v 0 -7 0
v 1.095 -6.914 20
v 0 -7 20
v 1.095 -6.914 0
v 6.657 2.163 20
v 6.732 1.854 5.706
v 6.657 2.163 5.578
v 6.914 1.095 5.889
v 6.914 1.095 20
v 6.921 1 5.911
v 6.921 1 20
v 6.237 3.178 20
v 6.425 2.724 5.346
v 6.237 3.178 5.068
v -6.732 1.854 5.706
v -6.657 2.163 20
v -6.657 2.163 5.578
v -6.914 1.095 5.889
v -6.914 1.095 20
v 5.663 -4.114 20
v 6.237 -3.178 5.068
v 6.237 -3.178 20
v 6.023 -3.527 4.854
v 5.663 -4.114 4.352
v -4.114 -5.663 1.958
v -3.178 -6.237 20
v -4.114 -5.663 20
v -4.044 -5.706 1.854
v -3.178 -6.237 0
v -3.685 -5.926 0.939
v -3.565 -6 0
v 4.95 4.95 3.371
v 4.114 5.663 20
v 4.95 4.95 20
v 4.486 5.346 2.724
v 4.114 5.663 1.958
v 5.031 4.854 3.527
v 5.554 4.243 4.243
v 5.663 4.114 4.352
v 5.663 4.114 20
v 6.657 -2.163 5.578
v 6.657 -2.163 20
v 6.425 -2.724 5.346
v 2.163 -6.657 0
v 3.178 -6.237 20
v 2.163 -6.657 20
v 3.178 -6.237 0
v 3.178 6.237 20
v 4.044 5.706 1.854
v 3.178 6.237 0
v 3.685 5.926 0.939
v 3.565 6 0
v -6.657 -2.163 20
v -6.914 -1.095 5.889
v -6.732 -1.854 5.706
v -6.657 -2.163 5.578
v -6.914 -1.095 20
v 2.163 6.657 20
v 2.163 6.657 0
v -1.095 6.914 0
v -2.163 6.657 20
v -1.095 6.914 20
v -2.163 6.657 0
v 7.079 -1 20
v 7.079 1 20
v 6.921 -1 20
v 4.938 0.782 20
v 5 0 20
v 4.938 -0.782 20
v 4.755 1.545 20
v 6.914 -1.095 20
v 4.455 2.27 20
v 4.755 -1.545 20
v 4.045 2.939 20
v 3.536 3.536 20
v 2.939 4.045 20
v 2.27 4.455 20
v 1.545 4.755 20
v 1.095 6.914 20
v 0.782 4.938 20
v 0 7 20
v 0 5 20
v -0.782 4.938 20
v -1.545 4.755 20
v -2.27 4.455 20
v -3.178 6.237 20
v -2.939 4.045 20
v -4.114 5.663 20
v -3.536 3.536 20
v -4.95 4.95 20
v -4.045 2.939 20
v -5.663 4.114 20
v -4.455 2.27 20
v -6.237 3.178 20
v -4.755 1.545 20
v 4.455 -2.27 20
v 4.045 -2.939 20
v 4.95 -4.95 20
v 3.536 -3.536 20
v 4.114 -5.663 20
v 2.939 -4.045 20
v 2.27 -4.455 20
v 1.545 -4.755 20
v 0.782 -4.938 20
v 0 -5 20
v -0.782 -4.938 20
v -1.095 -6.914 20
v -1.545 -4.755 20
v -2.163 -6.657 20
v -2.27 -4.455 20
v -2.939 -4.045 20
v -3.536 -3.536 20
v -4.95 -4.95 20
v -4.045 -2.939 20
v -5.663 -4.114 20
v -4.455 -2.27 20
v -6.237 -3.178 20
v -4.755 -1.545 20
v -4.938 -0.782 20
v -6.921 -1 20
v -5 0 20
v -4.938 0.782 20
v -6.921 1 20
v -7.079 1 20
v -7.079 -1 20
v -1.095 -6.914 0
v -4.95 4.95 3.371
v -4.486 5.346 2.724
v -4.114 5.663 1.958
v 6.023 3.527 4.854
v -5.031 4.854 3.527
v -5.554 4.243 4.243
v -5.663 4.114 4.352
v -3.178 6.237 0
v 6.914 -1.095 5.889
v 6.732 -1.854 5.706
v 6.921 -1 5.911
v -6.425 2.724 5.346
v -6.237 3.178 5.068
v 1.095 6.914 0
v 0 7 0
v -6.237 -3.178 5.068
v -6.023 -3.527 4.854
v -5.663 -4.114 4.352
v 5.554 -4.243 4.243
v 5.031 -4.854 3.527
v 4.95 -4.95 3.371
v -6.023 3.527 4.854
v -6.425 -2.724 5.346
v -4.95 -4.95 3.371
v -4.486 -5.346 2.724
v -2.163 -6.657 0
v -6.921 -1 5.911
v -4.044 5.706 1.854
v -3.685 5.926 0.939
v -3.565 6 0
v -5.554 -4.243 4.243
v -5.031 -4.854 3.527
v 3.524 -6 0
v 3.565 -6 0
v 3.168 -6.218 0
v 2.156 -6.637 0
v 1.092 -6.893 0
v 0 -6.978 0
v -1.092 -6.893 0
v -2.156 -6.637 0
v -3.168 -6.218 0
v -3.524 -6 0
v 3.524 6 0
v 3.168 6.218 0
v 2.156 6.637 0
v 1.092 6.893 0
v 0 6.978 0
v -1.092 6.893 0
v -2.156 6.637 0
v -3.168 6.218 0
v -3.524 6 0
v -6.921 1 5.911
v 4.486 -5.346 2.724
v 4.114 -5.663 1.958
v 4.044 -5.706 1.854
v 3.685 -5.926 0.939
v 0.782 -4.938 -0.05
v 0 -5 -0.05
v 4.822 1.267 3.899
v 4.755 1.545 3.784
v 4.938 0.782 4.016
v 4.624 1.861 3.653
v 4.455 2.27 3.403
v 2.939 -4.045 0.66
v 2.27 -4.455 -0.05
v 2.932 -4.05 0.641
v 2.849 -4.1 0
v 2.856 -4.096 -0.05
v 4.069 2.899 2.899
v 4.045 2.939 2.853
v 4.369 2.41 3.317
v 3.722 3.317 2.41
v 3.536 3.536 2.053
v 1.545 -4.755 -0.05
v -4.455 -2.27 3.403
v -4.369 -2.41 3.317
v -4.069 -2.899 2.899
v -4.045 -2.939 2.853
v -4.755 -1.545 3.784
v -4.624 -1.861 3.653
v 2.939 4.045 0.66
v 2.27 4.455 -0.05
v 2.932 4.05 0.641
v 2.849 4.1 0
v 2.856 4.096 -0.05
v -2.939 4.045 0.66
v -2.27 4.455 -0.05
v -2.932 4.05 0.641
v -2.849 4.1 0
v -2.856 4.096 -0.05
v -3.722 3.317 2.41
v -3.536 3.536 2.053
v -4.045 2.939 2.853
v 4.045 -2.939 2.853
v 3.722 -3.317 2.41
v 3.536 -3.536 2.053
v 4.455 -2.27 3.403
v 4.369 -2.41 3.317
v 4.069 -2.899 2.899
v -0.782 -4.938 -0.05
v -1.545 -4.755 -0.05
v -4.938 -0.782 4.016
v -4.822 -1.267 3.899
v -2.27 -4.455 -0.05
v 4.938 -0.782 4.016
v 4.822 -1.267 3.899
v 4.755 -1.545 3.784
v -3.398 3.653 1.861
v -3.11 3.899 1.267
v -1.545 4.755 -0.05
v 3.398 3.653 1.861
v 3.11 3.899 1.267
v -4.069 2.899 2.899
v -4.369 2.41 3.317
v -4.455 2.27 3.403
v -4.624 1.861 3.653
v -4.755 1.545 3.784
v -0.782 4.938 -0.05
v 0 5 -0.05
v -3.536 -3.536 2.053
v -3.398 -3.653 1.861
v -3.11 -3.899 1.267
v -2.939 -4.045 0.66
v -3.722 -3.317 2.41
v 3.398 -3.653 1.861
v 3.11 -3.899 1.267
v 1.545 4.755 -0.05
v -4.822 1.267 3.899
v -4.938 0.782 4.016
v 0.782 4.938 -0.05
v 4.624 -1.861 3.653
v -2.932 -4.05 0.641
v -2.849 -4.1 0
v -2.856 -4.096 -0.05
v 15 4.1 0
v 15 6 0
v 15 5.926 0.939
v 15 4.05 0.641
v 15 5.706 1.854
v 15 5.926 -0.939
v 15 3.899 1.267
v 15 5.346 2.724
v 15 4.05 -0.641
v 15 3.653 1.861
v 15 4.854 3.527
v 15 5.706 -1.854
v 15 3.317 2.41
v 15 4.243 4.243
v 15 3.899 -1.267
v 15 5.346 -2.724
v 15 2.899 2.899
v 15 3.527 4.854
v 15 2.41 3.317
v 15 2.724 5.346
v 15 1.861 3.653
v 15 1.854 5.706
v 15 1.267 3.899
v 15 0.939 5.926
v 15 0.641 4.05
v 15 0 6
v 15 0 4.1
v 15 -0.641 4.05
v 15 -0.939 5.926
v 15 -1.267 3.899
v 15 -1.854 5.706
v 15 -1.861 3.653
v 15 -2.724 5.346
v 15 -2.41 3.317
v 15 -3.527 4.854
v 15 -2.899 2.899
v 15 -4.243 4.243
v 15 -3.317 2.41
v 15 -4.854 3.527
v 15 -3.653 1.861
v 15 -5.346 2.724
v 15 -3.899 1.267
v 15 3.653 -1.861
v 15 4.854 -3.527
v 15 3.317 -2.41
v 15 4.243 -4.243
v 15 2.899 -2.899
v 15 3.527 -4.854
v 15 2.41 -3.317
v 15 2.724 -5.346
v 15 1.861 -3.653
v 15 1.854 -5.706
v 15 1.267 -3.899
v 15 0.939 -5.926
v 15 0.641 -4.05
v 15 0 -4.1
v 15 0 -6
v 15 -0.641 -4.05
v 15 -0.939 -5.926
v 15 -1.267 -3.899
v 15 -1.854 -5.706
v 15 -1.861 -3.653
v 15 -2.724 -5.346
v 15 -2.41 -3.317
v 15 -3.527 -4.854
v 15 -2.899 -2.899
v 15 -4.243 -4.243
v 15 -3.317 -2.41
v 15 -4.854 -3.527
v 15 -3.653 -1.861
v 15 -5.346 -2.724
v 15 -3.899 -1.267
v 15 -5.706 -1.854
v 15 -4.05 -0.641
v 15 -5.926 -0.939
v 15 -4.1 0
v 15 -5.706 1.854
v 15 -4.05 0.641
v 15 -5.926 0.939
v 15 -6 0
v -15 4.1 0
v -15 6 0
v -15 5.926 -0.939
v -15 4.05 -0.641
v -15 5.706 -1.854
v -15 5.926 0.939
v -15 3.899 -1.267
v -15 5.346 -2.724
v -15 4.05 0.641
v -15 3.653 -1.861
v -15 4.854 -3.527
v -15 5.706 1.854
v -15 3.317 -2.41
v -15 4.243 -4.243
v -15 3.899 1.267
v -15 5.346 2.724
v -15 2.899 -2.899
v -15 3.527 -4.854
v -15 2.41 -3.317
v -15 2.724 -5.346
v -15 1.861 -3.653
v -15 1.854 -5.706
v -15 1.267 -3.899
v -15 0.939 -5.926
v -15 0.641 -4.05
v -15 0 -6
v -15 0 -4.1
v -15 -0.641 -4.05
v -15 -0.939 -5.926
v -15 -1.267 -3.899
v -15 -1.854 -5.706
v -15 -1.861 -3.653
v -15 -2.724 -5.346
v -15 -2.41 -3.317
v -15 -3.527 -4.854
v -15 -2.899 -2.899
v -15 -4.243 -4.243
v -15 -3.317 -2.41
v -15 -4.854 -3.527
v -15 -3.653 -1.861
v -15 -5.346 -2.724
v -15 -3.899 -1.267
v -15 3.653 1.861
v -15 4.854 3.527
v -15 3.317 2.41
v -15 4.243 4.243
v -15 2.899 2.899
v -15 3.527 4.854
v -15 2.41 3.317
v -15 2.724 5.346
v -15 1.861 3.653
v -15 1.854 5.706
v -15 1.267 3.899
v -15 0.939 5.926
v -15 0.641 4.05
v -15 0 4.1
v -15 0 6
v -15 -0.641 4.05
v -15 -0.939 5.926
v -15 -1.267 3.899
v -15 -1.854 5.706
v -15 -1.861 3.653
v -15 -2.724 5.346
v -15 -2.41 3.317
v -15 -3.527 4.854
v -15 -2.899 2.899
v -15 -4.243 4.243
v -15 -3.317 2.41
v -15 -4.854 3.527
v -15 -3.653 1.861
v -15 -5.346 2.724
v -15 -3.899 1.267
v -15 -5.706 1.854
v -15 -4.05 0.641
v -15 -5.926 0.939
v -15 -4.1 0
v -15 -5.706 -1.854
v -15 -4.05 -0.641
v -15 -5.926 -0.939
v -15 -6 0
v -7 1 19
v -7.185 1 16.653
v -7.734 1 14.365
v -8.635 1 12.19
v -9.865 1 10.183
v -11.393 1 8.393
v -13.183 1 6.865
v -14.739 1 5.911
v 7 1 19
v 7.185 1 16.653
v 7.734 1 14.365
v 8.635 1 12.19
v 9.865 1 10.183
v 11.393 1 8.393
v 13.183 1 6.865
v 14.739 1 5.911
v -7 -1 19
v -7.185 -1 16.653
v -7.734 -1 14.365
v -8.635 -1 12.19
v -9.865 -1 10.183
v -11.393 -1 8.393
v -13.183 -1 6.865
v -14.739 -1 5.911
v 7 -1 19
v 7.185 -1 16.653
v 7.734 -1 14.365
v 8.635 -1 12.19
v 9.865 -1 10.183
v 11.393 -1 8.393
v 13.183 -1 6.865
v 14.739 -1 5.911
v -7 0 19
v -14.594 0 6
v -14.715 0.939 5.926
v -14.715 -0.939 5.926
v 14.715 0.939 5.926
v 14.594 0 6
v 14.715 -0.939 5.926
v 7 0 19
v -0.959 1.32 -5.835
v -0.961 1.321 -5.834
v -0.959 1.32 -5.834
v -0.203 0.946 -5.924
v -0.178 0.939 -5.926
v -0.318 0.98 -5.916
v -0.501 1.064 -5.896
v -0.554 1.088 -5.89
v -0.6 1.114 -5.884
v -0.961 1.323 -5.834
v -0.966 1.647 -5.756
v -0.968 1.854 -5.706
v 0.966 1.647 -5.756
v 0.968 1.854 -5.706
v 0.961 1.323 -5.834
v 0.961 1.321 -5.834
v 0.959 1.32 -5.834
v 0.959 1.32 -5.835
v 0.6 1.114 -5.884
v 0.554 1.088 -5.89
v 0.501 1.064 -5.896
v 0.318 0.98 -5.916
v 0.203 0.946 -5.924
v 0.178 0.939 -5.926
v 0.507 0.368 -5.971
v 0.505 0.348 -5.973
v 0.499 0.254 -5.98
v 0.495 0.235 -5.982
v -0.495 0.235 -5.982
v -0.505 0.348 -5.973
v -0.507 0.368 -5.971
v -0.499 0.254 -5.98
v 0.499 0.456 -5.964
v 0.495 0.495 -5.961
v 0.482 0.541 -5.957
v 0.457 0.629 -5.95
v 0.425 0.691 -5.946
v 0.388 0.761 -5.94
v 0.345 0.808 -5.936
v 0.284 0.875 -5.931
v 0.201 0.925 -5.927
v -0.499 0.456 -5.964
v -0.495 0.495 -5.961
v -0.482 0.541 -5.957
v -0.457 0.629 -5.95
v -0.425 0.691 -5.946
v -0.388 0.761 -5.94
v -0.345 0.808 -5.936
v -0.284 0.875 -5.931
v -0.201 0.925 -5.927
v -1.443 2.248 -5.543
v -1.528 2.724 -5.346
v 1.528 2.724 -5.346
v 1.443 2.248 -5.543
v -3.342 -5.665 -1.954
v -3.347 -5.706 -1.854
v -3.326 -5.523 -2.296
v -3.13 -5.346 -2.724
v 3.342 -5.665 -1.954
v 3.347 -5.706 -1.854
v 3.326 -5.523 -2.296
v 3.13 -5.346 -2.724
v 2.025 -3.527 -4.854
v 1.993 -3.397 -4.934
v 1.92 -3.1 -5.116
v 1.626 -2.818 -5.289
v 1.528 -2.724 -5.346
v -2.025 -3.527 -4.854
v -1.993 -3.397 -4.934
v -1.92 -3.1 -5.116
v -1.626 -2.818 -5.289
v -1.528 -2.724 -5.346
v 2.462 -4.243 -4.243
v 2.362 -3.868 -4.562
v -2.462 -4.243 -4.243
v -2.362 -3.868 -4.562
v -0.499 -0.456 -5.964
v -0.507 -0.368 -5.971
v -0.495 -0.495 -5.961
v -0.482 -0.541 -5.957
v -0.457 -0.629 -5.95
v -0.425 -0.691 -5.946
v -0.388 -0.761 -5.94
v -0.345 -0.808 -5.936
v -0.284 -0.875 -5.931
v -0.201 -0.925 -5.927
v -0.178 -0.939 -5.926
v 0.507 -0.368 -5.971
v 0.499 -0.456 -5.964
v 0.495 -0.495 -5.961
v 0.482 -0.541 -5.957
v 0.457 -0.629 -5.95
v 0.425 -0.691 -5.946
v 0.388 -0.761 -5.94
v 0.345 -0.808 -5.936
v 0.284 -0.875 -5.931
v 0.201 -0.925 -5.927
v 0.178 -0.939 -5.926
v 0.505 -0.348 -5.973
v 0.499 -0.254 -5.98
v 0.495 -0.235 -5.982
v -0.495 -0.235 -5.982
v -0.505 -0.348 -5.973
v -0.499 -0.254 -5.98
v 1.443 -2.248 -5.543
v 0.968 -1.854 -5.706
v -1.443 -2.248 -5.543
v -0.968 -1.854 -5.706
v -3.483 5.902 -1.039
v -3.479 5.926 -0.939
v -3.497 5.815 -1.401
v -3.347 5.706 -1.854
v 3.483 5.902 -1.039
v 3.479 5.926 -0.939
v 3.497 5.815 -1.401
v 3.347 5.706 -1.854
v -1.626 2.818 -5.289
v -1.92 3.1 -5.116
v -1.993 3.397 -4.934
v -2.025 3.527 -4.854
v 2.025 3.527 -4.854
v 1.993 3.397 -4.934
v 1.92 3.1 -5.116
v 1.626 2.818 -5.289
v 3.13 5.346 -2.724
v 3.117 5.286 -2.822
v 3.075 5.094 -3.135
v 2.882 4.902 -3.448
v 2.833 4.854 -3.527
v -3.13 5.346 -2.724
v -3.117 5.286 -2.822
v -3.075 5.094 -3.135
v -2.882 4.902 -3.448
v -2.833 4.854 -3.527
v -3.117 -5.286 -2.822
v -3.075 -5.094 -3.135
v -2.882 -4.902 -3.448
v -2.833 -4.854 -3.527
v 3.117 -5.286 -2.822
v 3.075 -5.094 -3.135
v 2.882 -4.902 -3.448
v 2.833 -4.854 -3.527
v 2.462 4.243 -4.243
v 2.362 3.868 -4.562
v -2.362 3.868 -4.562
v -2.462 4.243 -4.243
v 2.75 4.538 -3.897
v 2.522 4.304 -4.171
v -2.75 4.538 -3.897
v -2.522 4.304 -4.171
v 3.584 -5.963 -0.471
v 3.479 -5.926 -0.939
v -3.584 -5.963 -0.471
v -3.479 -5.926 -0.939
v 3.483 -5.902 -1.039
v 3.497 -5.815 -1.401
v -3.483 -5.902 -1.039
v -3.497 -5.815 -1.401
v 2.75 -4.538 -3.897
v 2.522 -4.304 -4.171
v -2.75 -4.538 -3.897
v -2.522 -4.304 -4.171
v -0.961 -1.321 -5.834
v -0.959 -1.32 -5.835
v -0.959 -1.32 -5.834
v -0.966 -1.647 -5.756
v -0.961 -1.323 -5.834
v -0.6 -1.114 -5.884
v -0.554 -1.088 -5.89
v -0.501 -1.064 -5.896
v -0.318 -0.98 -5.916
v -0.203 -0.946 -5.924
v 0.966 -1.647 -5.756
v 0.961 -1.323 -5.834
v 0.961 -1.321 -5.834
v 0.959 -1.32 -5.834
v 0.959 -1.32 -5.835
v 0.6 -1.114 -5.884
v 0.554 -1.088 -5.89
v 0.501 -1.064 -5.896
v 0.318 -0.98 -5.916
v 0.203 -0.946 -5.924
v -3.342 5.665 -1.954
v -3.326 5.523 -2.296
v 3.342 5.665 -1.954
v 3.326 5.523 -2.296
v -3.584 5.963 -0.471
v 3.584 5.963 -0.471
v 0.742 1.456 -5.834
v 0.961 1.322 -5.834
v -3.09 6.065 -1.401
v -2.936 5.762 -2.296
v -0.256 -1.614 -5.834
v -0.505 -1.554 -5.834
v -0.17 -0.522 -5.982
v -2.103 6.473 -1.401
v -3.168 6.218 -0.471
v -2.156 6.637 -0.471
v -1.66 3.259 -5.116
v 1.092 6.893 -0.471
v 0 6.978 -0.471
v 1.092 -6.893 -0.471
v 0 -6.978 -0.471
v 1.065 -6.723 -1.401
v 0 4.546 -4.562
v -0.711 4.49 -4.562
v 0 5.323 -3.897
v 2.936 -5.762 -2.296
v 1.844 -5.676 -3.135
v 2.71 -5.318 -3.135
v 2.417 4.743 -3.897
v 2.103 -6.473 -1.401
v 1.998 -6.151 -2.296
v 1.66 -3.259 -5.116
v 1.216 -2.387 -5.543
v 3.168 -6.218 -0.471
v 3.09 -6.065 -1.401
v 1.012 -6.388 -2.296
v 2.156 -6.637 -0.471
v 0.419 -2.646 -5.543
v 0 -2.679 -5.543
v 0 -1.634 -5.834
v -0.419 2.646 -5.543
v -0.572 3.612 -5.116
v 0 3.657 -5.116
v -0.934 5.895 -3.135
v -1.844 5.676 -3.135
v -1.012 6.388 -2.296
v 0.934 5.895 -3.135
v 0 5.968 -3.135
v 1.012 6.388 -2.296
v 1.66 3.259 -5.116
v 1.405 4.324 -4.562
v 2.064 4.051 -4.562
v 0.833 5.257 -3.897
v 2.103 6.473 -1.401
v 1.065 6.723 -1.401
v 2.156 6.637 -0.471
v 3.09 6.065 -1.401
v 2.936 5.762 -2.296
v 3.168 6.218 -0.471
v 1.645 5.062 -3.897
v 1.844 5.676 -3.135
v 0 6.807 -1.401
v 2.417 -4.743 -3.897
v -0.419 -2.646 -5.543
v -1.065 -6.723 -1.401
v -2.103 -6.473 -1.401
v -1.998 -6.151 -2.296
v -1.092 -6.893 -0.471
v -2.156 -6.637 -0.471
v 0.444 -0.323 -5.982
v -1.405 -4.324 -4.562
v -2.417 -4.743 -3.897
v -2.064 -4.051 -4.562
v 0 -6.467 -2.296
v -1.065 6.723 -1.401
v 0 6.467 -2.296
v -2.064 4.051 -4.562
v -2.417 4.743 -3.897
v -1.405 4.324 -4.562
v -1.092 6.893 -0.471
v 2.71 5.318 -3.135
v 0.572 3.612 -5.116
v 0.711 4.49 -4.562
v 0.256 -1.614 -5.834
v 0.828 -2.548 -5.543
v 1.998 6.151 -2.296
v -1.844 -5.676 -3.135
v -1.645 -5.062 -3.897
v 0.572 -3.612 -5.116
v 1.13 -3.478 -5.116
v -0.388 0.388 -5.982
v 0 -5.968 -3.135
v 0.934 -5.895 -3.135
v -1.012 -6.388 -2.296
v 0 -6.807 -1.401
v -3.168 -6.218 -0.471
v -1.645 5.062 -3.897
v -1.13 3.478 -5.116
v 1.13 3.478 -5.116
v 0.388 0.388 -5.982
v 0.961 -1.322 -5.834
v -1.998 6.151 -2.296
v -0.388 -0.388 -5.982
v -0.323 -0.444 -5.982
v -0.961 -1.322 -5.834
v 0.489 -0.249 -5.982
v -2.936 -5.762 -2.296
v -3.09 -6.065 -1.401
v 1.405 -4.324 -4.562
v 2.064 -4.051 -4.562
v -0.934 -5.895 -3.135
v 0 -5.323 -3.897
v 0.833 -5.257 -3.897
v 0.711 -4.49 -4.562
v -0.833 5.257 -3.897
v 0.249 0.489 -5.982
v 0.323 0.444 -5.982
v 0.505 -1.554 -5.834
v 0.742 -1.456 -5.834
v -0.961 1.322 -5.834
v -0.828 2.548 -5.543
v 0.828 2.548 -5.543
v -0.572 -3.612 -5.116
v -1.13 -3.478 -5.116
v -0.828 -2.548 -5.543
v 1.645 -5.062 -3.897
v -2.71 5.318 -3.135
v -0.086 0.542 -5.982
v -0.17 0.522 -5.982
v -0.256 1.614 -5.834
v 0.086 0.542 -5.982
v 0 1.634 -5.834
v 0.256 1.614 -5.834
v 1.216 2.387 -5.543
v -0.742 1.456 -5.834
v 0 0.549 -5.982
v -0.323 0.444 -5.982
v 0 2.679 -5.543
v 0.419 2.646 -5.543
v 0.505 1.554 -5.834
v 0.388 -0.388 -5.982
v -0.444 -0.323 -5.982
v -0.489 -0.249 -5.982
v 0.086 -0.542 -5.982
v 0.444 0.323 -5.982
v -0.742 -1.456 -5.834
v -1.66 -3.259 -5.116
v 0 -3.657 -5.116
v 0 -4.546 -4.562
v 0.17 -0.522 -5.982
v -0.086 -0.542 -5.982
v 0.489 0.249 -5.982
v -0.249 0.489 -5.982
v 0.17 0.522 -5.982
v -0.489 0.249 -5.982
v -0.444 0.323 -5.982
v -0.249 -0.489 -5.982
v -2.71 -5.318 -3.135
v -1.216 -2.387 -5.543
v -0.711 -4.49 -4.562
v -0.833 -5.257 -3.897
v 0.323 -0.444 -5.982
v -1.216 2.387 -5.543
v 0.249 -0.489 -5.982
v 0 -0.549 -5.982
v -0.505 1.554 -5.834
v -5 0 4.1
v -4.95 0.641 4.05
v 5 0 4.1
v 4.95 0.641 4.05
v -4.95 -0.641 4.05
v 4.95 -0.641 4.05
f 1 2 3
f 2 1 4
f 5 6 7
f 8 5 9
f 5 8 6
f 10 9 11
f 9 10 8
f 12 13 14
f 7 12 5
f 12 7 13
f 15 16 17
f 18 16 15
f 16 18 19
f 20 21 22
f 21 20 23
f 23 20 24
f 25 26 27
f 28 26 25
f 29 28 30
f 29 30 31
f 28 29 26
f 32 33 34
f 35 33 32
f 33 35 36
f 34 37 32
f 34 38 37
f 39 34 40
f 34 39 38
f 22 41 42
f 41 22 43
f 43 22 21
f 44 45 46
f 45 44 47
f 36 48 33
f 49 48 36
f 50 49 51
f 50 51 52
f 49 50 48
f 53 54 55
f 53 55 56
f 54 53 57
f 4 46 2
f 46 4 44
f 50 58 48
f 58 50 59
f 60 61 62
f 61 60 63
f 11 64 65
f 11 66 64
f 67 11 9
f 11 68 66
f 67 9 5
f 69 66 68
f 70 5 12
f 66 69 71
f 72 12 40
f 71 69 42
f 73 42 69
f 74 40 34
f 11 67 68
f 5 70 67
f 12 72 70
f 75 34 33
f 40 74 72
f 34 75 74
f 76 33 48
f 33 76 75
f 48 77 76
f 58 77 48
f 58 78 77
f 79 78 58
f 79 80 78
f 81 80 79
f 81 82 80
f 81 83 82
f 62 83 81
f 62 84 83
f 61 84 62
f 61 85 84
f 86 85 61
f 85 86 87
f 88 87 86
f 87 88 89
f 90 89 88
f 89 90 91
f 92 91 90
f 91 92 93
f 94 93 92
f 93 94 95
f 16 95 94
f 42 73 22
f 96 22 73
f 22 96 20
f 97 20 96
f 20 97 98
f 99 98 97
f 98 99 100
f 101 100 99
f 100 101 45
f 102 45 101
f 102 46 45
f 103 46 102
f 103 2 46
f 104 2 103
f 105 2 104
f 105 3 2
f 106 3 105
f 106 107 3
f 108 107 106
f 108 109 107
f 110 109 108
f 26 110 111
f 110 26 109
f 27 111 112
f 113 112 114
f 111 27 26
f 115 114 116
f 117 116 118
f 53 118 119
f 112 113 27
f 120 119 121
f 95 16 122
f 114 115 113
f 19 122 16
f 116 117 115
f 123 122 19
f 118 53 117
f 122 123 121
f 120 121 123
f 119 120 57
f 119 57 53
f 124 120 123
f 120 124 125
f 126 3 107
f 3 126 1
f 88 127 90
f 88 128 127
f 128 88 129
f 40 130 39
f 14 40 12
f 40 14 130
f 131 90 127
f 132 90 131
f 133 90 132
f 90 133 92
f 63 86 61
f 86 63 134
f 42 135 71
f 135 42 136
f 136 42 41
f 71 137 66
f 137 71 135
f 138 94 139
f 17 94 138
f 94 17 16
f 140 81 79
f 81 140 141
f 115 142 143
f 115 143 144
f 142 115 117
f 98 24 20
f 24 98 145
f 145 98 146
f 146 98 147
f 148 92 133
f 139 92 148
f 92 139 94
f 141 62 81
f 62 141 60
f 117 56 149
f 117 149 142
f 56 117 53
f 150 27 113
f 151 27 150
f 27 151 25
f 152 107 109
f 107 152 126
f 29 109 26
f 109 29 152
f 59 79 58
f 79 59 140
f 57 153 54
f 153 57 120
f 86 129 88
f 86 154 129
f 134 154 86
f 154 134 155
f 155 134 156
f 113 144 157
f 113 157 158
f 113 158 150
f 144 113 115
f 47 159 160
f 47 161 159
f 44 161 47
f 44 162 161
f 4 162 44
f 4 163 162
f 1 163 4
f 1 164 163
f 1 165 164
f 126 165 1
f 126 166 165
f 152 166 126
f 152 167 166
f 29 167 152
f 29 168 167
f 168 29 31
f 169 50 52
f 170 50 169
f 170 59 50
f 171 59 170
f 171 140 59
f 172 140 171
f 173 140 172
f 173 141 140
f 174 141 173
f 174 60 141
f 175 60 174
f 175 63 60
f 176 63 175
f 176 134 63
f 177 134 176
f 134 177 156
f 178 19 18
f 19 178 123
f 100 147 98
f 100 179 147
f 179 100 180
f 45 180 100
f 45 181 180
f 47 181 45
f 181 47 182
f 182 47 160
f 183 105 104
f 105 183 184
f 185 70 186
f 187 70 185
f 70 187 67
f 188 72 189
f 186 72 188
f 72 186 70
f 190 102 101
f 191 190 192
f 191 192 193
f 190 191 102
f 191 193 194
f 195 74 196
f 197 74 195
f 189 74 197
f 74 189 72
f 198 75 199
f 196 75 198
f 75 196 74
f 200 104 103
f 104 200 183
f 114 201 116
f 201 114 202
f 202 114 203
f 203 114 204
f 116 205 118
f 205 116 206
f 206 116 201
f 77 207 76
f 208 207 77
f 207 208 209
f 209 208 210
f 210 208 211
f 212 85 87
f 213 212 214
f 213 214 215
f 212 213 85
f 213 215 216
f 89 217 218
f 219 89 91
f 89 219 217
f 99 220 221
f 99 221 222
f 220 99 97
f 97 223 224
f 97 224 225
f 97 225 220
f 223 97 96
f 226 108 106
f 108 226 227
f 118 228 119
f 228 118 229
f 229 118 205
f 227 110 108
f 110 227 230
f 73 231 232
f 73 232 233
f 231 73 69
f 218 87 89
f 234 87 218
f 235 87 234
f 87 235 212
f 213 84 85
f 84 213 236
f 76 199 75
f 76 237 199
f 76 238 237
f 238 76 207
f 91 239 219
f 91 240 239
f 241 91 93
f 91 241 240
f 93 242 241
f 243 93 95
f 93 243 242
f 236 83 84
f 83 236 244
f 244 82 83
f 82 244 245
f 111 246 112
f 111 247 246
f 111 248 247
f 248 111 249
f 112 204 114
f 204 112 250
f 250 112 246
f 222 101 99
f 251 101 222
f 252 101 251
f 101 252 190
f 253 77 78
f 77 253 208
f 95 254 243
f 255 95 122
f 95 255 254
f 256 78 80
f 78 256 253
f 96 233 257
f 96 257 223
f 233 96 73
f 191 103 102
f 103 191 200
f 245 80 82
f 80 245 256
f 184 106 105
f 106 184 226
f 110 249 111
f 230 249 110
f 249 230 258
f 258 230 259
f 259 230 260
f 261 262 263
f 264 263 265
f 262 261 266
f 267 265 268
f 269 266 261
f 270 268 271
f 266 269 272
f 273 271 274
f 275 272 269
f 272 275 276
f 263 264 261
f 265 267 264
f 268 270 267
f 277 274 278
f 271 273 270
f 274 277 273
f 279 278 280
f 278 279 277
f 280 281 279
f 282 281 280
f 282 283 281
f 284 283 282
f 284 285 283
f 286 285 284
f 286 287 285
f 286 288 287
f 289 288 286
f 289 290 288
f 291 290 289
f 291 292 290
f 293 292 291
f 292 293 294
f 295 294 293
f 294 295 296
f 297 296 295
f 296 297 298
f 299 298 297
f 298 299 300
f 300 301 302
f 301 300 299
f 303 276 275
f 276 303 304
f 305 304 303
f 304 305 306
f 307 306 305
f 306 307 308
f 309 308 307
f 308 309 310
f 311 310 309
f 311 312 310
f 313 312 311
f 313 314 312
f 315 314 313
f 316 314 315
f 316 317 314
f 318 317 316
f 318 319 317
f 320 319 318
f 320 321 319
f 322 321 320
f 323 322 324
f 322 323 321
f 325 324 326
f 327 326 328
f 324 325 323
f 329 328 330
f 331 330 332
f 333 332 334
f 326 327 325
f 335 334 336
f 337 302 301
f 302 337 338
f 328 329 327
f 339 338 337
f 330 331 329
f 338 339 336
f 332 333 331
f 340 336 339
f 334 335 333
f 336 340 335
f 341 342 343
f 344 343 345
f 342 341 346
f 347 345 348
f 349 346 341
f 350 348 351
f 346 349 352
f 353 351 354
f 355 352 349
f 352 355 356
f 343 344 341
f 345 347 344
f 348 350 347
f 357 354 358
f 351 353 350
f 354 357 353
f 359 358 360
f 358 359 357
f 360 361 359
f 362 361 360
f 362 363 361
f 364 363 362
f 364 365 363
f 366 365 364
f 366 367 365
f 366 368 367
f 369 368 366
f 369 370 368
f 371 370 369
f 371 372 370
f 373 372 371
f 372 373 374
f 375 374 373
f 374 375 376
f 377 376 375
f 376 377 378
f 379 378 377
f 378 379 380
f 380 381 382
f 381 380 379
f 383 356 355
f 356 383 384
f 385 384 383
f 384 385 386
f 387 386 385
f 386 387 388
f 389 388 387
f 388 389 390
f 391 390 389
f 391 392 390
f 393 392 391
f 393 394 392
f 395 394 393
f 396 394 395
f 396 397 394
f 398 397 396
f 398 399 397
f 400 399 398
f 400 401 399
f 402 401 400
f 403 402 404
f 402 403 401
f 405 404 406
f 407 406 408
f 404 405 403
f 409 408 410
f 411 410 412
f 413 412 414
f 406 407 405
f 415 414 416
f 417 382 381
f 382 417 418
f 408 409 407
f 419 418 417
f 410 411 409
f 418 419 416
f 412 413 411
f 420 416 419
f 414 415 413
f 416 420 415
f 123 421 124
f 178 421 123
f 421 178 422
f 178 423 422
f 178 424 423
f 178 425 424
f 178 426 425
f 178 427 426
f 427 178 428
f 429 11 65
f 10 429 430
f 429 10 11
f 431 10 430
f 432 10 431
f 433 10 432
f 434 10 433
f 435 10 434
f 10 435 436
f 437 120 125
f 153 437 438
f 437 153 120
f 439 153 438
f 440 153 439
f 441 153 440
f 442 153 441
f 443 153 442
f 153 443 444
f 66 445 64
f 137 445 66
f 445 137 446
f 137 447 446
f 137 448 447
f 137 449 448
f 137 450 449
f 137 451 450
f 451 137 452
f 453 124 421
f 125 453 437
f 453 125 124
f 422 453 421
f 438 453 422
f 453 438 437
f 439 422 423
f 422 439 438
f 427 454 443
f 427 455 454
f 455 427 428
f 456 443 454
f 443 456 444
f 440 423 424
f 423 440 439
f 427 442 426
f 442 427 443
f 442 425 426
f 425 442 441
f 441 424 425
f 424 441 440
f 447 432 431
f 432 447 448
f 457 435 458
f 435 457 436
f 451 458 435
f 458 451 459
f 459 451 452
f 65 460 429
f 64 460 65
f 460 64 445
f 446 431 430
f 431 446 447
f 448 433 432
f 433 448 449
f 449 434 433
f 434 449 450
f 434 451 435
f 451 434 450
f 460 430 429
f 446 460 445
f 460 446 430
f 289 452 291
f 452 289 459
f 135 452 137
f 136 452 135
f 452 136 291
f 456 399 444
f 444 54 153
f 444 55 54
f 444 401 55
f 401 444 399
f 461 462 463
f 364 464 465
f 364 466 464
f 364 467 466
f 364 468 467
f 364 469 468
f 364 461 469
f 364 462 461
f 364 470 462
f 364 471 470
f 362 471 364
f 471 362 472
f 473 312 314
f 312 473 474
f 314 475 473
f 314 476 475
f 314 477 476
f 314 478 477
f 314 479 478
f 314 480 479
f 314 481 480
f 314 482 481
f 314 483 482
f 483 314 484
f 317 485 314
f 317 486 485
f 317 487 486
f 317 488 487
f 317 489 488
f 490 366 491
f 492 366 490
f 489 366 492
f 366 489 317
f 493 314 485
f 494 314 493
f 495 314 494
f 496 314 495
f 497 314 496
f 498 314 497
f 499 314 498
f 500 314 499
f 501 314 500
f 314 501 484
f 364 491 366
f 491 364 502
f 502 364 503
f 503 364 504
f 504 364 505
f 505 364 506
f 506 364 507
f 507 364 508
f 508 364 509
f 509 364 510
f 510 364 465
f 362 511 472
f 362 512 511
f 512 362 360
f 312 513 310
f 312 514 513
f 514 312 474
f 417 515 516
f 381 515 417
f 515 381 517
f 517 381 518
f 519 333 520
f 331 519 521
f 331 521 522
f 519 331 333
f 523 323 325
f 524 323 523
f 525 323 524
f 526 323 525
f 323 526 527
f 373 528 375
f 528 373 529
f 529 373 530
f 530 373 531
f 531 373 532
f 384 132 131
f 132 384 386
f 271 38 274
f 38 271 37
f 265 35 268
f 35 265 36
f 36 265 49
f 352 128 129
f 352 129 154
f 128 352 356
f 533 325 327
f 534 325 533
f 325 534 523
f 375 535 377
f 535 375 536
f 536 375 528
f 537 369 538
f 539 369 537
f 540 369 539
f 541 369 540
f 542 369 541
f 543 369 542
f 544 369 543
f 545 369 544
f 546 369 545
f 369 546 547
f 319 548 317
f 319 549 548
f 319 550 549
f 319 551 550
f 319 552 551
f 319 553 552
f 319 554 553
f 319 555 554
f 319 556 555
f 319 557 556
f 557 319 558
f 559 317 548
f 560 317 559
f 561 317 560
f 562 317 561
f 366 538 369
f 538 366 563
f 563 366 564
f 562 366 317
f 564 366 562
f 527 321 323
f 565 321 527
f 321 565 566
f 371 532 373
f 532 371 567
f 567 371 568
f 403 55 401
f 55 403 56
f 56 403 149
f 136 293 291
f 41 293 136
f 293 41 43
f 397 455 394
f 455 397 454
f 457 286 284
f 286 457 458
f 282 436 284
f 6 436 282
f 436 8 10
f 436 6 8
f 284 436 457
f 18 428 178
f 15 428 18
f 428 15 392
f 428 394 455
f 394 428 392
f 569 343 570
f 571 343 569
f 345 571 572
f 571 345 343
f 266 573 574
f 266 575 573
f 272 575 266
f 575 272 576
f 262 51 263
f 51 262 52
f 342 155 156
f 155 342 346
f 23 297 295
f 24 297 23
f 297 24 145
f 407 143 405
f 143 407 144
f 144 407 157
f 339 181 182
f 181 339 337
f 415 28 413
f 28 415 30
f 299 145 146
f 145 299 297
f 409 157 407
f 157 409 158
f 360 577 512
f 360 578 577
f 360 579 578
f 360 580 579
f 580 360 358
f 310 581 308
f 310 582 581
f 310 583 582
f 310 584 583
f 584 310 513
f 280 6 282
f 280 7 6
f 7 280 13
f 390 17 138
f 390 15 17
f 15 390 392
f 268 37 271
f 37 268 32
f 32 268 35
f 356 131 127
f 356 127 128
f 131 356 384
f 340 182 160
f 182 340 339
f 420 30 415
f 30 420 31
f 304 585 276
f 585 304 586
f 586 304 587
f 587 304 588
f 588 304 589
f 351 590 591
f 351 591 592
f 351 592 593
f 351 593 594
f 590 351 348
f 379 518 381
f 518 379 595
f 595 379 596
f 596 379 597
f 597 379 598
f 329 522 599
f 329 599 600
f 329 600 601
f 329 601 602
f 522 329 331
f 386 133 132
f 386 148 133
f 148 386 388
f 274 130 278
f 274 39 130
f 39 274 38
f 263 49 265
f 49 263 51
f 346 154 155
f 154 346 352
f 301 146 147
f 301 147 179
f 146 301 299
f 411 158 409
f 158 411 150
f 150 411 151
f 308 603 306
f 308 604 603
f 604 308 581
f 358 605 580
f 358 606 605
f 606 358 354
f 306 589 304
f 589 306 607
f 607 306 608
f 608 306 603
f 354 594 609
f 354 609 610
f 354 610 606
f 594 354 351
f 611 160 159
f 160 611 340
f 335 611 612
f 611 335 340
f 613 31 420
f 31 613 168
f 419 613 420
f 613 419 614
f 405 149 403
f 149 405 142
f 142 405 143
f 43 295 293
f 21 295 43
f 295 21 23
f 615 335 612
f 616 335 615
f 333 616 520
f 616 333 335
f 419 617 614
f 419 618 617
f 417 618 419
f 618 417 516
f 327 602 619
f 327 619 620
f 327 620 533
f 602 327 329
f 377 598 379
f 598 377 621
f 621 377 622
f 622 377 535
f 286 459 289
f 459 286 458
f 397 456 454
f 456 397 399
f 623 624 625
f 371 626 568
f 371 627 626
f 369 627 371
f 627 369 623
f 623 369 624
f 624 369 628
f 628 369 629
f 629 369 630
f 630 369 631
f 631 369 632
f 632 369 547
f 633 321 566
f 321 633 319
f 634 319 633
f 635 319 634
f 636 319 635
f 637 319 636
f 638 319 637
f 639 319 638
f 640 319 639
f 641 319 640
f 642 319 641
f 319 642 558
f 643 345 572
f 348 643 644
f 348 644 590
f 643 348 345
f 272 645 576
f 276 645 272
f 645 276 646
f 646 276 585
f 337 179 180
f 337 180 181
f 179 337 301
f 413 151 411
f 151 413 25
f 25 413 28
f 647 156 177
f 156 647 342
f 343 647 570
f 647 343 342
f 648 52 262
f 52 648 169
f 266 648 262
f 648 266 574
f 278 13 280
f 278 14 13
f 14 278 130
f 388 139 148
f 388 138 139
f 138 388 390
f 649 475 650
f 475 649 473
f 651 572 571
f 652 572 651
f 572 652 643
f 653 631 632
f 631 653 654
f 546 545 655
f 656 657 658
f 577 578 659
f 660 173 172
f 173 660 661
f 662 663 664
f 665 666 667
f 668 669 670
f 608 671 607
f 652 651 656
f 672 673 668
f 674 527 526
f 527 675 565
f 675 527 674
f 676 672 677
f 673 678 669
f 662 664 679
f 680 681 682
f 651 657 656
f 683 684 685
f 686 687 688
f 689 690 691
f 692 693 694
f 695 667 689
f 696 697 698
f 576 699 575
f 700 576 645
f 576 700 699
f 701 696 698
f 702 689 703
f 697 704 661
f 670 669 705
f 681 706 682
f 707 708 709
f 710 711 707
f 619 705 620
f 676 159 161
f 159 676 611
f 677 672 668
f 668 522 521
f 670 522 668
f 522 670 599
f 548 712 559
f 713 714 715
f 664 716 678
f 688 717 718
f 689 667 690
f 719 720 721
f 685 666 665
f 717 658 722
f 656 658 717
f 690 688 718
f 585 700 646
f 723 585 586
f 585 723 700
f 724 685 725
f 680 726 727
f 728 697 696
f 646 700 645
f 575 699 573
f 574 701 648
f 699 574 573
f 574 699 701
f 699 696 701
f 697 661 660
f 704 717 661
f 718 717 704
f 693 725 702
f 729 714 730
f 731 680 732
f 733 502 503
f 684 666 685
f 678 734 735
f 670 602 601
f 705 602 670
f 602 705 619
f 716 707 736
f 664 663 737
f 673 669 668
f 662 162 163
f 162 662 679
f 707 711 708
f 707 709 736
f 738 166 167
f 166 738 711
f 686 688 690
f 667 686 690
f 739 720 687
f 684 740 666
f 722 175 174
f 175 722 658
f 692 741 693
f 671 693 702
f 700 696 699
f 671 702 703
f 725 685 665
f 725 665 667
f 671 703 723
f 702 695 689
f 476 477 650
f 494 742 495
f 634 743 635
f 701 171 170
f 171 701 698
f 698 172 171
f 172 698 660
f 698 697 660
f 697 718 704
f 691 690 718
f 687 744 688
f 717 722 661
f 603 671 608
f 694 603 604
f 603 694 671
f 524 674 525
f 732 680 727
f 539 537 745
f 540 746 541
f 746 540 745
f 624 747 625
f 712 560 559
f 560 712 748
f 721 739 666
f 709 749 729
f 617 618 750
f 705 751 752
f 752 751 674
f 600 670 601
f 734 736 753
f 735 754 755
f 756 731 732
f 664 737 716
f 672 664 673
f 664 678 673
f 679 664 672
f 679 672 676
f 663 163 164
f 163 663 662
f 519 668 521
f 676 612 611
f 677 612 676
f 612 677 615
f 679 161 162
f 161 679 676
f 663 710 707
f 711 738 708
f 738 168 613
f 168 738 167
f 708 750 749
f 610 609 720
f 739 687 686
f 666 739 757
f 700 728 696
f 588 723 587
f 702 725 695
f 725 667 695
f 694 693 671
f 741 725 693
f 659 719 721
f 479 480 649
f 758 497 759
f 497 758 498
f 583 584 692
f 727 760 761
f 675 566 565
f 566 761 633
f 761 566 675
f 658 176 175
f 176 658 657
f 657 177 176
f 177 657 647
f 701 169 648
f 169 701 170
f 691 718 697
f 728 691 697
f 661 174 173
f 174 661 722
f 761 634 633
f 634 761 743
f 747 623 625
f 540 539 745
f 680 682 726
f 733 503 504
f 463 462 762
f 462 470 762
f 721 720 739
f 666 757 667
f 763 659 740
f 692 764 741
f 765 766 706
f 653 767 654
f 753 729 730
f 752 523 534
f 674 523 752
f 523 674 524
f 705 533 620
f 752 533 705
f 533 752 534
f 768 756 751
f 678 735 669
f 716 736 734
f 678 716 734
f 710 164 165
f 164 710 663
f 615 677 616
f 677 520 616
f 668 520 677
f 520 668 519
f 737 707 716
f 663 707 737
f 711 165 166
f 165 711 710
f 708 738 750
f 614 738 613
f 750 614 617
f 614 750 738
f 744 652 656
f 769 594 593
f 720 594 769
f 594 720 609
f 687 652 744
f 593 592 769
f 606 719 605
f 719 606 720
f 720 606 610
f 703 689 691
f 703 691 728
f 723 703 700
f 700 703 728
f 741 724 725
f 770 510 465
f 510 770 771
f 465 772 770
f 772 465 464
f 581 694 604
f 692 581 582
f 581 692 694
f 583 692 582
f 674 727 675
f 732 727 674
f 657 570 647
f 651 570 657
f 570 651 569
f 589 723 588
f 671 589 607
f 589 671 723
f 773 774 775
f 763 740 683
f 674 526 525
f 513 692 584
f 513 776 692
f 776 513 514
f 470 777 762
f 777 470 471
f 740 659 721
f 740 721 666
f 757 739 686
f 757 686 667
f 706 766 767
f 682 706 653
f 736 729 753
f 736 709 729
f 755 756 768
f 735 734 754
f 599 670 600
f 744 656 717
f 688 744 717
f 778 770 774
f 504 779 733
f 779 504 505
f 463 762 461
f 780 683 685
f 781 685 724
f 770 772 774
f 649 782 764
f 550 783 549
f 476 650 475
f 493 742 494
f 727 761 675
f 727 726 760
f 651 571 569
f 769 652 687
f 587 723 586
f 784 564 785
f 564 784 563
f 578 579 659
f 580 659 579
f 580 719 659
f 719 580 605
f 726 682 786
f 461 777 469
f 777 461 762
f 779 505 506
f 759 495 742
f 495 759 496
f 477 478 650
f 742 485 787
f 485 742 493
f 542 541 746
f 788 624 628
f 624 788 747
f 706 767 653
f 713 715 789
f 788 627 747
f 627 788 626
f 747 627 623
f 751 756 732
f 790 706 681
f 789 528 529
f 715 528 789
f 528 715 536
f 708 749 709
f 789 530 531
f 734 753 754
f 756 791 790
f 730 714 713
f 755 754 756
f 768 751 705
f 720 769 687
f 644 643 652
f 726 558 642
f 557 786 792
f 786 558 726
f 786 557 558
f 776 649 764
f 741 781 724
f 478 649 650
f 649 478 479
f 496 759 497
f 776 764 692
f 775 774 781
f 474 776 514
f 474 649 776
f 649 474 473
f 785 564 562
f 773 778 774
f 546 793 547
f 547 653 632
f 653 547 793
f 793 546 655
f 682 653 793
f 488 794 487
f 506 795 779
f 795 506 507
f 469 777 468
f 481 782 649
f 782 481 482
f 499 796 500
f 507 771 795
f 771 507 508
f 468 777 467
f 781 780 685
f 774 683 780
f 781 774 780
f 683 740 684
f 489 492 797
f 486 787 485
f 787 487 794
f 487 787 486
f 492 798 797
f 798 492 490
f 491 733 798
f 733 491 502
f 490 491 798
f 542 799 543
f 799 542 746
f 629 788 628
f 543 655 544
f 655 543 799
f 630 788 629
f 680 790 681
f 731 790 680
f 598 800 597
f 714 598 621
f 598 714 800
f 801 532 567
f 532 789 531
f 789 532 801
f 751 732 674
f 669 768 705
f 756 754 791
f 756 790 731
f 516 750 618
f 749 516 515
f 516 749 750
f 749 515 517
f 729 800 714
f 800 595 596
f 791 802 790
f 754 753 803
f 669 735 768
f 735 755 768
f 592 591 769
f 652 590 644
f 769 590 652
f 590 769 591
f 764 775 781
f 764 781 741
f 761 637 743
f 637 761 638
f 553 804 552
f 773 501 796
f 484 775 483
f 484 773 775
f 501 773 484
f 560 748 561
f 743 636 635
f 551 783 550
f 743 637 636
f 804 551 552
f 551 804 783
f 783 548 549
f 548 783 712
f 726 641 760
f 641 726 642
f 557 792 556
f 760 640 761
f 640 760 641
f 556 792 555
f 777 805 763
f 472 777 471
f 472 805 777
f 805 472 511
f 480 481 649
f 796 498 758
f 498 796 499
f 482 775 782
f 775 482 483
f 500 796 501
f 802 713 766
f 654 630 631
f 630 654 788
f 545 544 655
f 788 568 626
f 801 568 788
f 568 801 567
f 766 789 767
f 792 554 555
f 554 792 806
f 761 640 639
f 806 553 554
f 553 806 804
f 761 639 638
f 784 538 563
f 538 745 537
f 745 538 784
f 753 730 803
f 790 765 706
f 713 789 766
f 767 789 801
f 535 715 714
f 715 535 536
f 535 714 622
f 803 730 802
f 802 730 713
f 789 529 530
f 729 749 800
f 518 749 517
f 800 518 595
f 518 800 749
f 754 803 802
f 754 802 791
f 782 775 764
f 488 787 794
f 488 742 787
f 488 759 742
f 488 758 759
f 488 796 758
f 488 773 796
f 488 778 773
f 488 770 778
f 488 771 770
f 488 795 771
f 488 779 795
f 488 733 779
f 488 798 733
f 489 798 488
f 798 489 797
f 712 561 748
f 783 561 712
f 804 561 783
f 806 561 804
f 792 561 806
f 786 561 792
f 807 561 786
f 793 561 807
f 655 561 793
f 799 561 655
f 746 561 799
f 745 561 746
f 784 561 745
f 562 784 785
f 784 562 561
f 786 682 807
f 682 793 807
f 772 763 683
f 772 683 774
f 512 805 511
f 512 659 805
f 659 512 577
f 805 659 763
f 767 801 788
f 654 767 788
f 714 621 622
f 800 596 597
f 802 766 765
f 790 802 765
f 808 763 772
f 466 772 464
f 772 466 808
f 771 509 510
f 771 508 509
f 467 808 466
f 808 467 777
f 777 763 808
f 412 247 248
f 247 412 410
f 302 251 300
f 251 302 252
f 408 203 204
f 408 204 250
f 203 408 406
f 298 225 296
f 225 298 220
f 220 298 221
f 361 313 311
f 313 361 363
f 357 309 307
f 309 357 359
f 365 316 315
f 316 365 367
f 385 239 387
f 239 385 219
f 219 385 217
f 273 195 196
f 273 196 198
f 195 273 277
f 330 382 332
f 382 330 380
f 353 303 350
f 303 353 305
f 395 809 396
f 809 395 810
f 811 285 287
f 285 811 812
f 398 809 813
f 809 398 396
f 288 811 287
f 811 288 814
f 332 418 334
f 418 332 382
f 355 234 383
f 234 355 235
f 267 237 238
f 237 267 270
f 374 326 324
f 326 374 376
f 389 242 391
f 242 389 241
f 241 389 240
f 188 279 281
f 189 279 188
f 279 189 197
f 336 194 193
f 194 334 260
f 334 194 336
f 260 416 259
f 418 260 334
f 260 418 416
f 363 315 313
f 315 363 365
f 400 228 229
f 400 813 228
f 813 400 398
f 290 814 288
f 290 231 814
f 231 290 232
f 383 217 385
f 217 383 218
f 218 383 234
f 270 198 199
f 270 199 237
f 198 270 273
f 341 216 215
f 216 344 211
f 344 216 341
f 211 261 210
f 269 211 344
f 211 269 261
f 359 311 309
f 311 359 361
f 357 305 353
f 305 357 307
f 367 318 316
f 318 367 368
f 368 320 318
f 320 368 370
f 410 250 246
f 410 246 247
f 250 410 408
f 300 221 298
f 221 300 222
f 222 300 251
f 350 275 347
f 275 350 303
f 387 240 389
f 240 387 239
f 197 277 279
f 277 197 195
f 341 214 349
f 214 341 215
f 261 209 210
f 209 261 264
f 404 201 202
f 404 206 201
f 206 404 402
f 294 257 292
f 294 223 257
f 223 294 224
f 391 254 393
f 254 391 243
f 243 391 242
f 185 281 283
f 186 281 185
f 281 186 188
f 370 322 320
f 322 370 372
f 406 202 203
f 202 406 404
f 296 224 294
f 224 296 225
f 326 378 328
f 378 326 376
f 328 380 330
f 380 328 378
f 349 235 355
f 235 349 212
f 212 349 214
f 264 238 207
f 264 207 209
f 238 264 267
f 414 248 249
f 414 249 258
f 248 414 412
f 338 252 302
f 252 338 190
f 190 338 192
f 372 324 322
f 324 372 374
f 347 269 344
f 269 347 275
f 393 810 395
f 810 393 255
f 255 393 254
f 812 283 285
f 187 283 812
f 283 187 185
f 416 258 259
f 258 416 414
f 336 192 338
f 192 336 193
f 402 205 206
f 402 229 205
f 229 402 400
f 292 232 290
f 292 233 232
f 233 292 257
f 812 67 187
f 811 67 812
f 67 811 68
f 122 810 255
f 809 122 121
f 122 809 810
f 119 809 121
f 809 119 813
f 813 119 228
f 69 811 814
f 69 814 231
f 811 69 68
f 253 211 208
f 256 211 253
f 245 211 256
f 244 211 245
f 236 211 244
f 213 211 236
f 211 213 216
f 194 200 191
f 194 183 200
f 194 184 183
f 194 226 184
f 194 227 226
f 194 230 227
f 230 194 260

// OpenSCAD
$fn=40;

module tube(d,l,w){
        difference(){
            cylinder(r=d/2+w,h=l,center=true);
            cylinder(r=d/2,h=l+0.1,center=true);
        }
}

module clip(d1,l1,d2,l2,w){
        rr = l1/2;
        shf=2;
        difference(){
            union(){
                translate([0,0,l2/2]) tube(d2,l2,w);
                difference(){
                    translate([0,0,l2/2]) cube([l1,2,l2],center=true);
                    translate([-(d2/2+w+rr),0,d1/2+w+rr-shf]) rotate ([90,0,0]) cylinder(r=rr,h=w*2, center=true);
                    translate([(d2/2+w+rr),0,d1/2+w+rr-shf]) rotate ([90,0,0]) cylinder(r=rr,h=w*2, center=true);
                }
                rotate([0,90,0]) tube(d1,l1,w);
                scale([1,1,(d1+2*w)/(d2+2*w)]) sphere(r=d2/2+w);
            }

            rotate([0,90,0]) cylinder(r=d1/2+0.1,h=l1+0.1, center=true);
            translate([0,0,l2/2]) cylinder(r=d2/2,h=l2+0.1, center=true);
        }
        
}

clip(8,30,10,20,2);
